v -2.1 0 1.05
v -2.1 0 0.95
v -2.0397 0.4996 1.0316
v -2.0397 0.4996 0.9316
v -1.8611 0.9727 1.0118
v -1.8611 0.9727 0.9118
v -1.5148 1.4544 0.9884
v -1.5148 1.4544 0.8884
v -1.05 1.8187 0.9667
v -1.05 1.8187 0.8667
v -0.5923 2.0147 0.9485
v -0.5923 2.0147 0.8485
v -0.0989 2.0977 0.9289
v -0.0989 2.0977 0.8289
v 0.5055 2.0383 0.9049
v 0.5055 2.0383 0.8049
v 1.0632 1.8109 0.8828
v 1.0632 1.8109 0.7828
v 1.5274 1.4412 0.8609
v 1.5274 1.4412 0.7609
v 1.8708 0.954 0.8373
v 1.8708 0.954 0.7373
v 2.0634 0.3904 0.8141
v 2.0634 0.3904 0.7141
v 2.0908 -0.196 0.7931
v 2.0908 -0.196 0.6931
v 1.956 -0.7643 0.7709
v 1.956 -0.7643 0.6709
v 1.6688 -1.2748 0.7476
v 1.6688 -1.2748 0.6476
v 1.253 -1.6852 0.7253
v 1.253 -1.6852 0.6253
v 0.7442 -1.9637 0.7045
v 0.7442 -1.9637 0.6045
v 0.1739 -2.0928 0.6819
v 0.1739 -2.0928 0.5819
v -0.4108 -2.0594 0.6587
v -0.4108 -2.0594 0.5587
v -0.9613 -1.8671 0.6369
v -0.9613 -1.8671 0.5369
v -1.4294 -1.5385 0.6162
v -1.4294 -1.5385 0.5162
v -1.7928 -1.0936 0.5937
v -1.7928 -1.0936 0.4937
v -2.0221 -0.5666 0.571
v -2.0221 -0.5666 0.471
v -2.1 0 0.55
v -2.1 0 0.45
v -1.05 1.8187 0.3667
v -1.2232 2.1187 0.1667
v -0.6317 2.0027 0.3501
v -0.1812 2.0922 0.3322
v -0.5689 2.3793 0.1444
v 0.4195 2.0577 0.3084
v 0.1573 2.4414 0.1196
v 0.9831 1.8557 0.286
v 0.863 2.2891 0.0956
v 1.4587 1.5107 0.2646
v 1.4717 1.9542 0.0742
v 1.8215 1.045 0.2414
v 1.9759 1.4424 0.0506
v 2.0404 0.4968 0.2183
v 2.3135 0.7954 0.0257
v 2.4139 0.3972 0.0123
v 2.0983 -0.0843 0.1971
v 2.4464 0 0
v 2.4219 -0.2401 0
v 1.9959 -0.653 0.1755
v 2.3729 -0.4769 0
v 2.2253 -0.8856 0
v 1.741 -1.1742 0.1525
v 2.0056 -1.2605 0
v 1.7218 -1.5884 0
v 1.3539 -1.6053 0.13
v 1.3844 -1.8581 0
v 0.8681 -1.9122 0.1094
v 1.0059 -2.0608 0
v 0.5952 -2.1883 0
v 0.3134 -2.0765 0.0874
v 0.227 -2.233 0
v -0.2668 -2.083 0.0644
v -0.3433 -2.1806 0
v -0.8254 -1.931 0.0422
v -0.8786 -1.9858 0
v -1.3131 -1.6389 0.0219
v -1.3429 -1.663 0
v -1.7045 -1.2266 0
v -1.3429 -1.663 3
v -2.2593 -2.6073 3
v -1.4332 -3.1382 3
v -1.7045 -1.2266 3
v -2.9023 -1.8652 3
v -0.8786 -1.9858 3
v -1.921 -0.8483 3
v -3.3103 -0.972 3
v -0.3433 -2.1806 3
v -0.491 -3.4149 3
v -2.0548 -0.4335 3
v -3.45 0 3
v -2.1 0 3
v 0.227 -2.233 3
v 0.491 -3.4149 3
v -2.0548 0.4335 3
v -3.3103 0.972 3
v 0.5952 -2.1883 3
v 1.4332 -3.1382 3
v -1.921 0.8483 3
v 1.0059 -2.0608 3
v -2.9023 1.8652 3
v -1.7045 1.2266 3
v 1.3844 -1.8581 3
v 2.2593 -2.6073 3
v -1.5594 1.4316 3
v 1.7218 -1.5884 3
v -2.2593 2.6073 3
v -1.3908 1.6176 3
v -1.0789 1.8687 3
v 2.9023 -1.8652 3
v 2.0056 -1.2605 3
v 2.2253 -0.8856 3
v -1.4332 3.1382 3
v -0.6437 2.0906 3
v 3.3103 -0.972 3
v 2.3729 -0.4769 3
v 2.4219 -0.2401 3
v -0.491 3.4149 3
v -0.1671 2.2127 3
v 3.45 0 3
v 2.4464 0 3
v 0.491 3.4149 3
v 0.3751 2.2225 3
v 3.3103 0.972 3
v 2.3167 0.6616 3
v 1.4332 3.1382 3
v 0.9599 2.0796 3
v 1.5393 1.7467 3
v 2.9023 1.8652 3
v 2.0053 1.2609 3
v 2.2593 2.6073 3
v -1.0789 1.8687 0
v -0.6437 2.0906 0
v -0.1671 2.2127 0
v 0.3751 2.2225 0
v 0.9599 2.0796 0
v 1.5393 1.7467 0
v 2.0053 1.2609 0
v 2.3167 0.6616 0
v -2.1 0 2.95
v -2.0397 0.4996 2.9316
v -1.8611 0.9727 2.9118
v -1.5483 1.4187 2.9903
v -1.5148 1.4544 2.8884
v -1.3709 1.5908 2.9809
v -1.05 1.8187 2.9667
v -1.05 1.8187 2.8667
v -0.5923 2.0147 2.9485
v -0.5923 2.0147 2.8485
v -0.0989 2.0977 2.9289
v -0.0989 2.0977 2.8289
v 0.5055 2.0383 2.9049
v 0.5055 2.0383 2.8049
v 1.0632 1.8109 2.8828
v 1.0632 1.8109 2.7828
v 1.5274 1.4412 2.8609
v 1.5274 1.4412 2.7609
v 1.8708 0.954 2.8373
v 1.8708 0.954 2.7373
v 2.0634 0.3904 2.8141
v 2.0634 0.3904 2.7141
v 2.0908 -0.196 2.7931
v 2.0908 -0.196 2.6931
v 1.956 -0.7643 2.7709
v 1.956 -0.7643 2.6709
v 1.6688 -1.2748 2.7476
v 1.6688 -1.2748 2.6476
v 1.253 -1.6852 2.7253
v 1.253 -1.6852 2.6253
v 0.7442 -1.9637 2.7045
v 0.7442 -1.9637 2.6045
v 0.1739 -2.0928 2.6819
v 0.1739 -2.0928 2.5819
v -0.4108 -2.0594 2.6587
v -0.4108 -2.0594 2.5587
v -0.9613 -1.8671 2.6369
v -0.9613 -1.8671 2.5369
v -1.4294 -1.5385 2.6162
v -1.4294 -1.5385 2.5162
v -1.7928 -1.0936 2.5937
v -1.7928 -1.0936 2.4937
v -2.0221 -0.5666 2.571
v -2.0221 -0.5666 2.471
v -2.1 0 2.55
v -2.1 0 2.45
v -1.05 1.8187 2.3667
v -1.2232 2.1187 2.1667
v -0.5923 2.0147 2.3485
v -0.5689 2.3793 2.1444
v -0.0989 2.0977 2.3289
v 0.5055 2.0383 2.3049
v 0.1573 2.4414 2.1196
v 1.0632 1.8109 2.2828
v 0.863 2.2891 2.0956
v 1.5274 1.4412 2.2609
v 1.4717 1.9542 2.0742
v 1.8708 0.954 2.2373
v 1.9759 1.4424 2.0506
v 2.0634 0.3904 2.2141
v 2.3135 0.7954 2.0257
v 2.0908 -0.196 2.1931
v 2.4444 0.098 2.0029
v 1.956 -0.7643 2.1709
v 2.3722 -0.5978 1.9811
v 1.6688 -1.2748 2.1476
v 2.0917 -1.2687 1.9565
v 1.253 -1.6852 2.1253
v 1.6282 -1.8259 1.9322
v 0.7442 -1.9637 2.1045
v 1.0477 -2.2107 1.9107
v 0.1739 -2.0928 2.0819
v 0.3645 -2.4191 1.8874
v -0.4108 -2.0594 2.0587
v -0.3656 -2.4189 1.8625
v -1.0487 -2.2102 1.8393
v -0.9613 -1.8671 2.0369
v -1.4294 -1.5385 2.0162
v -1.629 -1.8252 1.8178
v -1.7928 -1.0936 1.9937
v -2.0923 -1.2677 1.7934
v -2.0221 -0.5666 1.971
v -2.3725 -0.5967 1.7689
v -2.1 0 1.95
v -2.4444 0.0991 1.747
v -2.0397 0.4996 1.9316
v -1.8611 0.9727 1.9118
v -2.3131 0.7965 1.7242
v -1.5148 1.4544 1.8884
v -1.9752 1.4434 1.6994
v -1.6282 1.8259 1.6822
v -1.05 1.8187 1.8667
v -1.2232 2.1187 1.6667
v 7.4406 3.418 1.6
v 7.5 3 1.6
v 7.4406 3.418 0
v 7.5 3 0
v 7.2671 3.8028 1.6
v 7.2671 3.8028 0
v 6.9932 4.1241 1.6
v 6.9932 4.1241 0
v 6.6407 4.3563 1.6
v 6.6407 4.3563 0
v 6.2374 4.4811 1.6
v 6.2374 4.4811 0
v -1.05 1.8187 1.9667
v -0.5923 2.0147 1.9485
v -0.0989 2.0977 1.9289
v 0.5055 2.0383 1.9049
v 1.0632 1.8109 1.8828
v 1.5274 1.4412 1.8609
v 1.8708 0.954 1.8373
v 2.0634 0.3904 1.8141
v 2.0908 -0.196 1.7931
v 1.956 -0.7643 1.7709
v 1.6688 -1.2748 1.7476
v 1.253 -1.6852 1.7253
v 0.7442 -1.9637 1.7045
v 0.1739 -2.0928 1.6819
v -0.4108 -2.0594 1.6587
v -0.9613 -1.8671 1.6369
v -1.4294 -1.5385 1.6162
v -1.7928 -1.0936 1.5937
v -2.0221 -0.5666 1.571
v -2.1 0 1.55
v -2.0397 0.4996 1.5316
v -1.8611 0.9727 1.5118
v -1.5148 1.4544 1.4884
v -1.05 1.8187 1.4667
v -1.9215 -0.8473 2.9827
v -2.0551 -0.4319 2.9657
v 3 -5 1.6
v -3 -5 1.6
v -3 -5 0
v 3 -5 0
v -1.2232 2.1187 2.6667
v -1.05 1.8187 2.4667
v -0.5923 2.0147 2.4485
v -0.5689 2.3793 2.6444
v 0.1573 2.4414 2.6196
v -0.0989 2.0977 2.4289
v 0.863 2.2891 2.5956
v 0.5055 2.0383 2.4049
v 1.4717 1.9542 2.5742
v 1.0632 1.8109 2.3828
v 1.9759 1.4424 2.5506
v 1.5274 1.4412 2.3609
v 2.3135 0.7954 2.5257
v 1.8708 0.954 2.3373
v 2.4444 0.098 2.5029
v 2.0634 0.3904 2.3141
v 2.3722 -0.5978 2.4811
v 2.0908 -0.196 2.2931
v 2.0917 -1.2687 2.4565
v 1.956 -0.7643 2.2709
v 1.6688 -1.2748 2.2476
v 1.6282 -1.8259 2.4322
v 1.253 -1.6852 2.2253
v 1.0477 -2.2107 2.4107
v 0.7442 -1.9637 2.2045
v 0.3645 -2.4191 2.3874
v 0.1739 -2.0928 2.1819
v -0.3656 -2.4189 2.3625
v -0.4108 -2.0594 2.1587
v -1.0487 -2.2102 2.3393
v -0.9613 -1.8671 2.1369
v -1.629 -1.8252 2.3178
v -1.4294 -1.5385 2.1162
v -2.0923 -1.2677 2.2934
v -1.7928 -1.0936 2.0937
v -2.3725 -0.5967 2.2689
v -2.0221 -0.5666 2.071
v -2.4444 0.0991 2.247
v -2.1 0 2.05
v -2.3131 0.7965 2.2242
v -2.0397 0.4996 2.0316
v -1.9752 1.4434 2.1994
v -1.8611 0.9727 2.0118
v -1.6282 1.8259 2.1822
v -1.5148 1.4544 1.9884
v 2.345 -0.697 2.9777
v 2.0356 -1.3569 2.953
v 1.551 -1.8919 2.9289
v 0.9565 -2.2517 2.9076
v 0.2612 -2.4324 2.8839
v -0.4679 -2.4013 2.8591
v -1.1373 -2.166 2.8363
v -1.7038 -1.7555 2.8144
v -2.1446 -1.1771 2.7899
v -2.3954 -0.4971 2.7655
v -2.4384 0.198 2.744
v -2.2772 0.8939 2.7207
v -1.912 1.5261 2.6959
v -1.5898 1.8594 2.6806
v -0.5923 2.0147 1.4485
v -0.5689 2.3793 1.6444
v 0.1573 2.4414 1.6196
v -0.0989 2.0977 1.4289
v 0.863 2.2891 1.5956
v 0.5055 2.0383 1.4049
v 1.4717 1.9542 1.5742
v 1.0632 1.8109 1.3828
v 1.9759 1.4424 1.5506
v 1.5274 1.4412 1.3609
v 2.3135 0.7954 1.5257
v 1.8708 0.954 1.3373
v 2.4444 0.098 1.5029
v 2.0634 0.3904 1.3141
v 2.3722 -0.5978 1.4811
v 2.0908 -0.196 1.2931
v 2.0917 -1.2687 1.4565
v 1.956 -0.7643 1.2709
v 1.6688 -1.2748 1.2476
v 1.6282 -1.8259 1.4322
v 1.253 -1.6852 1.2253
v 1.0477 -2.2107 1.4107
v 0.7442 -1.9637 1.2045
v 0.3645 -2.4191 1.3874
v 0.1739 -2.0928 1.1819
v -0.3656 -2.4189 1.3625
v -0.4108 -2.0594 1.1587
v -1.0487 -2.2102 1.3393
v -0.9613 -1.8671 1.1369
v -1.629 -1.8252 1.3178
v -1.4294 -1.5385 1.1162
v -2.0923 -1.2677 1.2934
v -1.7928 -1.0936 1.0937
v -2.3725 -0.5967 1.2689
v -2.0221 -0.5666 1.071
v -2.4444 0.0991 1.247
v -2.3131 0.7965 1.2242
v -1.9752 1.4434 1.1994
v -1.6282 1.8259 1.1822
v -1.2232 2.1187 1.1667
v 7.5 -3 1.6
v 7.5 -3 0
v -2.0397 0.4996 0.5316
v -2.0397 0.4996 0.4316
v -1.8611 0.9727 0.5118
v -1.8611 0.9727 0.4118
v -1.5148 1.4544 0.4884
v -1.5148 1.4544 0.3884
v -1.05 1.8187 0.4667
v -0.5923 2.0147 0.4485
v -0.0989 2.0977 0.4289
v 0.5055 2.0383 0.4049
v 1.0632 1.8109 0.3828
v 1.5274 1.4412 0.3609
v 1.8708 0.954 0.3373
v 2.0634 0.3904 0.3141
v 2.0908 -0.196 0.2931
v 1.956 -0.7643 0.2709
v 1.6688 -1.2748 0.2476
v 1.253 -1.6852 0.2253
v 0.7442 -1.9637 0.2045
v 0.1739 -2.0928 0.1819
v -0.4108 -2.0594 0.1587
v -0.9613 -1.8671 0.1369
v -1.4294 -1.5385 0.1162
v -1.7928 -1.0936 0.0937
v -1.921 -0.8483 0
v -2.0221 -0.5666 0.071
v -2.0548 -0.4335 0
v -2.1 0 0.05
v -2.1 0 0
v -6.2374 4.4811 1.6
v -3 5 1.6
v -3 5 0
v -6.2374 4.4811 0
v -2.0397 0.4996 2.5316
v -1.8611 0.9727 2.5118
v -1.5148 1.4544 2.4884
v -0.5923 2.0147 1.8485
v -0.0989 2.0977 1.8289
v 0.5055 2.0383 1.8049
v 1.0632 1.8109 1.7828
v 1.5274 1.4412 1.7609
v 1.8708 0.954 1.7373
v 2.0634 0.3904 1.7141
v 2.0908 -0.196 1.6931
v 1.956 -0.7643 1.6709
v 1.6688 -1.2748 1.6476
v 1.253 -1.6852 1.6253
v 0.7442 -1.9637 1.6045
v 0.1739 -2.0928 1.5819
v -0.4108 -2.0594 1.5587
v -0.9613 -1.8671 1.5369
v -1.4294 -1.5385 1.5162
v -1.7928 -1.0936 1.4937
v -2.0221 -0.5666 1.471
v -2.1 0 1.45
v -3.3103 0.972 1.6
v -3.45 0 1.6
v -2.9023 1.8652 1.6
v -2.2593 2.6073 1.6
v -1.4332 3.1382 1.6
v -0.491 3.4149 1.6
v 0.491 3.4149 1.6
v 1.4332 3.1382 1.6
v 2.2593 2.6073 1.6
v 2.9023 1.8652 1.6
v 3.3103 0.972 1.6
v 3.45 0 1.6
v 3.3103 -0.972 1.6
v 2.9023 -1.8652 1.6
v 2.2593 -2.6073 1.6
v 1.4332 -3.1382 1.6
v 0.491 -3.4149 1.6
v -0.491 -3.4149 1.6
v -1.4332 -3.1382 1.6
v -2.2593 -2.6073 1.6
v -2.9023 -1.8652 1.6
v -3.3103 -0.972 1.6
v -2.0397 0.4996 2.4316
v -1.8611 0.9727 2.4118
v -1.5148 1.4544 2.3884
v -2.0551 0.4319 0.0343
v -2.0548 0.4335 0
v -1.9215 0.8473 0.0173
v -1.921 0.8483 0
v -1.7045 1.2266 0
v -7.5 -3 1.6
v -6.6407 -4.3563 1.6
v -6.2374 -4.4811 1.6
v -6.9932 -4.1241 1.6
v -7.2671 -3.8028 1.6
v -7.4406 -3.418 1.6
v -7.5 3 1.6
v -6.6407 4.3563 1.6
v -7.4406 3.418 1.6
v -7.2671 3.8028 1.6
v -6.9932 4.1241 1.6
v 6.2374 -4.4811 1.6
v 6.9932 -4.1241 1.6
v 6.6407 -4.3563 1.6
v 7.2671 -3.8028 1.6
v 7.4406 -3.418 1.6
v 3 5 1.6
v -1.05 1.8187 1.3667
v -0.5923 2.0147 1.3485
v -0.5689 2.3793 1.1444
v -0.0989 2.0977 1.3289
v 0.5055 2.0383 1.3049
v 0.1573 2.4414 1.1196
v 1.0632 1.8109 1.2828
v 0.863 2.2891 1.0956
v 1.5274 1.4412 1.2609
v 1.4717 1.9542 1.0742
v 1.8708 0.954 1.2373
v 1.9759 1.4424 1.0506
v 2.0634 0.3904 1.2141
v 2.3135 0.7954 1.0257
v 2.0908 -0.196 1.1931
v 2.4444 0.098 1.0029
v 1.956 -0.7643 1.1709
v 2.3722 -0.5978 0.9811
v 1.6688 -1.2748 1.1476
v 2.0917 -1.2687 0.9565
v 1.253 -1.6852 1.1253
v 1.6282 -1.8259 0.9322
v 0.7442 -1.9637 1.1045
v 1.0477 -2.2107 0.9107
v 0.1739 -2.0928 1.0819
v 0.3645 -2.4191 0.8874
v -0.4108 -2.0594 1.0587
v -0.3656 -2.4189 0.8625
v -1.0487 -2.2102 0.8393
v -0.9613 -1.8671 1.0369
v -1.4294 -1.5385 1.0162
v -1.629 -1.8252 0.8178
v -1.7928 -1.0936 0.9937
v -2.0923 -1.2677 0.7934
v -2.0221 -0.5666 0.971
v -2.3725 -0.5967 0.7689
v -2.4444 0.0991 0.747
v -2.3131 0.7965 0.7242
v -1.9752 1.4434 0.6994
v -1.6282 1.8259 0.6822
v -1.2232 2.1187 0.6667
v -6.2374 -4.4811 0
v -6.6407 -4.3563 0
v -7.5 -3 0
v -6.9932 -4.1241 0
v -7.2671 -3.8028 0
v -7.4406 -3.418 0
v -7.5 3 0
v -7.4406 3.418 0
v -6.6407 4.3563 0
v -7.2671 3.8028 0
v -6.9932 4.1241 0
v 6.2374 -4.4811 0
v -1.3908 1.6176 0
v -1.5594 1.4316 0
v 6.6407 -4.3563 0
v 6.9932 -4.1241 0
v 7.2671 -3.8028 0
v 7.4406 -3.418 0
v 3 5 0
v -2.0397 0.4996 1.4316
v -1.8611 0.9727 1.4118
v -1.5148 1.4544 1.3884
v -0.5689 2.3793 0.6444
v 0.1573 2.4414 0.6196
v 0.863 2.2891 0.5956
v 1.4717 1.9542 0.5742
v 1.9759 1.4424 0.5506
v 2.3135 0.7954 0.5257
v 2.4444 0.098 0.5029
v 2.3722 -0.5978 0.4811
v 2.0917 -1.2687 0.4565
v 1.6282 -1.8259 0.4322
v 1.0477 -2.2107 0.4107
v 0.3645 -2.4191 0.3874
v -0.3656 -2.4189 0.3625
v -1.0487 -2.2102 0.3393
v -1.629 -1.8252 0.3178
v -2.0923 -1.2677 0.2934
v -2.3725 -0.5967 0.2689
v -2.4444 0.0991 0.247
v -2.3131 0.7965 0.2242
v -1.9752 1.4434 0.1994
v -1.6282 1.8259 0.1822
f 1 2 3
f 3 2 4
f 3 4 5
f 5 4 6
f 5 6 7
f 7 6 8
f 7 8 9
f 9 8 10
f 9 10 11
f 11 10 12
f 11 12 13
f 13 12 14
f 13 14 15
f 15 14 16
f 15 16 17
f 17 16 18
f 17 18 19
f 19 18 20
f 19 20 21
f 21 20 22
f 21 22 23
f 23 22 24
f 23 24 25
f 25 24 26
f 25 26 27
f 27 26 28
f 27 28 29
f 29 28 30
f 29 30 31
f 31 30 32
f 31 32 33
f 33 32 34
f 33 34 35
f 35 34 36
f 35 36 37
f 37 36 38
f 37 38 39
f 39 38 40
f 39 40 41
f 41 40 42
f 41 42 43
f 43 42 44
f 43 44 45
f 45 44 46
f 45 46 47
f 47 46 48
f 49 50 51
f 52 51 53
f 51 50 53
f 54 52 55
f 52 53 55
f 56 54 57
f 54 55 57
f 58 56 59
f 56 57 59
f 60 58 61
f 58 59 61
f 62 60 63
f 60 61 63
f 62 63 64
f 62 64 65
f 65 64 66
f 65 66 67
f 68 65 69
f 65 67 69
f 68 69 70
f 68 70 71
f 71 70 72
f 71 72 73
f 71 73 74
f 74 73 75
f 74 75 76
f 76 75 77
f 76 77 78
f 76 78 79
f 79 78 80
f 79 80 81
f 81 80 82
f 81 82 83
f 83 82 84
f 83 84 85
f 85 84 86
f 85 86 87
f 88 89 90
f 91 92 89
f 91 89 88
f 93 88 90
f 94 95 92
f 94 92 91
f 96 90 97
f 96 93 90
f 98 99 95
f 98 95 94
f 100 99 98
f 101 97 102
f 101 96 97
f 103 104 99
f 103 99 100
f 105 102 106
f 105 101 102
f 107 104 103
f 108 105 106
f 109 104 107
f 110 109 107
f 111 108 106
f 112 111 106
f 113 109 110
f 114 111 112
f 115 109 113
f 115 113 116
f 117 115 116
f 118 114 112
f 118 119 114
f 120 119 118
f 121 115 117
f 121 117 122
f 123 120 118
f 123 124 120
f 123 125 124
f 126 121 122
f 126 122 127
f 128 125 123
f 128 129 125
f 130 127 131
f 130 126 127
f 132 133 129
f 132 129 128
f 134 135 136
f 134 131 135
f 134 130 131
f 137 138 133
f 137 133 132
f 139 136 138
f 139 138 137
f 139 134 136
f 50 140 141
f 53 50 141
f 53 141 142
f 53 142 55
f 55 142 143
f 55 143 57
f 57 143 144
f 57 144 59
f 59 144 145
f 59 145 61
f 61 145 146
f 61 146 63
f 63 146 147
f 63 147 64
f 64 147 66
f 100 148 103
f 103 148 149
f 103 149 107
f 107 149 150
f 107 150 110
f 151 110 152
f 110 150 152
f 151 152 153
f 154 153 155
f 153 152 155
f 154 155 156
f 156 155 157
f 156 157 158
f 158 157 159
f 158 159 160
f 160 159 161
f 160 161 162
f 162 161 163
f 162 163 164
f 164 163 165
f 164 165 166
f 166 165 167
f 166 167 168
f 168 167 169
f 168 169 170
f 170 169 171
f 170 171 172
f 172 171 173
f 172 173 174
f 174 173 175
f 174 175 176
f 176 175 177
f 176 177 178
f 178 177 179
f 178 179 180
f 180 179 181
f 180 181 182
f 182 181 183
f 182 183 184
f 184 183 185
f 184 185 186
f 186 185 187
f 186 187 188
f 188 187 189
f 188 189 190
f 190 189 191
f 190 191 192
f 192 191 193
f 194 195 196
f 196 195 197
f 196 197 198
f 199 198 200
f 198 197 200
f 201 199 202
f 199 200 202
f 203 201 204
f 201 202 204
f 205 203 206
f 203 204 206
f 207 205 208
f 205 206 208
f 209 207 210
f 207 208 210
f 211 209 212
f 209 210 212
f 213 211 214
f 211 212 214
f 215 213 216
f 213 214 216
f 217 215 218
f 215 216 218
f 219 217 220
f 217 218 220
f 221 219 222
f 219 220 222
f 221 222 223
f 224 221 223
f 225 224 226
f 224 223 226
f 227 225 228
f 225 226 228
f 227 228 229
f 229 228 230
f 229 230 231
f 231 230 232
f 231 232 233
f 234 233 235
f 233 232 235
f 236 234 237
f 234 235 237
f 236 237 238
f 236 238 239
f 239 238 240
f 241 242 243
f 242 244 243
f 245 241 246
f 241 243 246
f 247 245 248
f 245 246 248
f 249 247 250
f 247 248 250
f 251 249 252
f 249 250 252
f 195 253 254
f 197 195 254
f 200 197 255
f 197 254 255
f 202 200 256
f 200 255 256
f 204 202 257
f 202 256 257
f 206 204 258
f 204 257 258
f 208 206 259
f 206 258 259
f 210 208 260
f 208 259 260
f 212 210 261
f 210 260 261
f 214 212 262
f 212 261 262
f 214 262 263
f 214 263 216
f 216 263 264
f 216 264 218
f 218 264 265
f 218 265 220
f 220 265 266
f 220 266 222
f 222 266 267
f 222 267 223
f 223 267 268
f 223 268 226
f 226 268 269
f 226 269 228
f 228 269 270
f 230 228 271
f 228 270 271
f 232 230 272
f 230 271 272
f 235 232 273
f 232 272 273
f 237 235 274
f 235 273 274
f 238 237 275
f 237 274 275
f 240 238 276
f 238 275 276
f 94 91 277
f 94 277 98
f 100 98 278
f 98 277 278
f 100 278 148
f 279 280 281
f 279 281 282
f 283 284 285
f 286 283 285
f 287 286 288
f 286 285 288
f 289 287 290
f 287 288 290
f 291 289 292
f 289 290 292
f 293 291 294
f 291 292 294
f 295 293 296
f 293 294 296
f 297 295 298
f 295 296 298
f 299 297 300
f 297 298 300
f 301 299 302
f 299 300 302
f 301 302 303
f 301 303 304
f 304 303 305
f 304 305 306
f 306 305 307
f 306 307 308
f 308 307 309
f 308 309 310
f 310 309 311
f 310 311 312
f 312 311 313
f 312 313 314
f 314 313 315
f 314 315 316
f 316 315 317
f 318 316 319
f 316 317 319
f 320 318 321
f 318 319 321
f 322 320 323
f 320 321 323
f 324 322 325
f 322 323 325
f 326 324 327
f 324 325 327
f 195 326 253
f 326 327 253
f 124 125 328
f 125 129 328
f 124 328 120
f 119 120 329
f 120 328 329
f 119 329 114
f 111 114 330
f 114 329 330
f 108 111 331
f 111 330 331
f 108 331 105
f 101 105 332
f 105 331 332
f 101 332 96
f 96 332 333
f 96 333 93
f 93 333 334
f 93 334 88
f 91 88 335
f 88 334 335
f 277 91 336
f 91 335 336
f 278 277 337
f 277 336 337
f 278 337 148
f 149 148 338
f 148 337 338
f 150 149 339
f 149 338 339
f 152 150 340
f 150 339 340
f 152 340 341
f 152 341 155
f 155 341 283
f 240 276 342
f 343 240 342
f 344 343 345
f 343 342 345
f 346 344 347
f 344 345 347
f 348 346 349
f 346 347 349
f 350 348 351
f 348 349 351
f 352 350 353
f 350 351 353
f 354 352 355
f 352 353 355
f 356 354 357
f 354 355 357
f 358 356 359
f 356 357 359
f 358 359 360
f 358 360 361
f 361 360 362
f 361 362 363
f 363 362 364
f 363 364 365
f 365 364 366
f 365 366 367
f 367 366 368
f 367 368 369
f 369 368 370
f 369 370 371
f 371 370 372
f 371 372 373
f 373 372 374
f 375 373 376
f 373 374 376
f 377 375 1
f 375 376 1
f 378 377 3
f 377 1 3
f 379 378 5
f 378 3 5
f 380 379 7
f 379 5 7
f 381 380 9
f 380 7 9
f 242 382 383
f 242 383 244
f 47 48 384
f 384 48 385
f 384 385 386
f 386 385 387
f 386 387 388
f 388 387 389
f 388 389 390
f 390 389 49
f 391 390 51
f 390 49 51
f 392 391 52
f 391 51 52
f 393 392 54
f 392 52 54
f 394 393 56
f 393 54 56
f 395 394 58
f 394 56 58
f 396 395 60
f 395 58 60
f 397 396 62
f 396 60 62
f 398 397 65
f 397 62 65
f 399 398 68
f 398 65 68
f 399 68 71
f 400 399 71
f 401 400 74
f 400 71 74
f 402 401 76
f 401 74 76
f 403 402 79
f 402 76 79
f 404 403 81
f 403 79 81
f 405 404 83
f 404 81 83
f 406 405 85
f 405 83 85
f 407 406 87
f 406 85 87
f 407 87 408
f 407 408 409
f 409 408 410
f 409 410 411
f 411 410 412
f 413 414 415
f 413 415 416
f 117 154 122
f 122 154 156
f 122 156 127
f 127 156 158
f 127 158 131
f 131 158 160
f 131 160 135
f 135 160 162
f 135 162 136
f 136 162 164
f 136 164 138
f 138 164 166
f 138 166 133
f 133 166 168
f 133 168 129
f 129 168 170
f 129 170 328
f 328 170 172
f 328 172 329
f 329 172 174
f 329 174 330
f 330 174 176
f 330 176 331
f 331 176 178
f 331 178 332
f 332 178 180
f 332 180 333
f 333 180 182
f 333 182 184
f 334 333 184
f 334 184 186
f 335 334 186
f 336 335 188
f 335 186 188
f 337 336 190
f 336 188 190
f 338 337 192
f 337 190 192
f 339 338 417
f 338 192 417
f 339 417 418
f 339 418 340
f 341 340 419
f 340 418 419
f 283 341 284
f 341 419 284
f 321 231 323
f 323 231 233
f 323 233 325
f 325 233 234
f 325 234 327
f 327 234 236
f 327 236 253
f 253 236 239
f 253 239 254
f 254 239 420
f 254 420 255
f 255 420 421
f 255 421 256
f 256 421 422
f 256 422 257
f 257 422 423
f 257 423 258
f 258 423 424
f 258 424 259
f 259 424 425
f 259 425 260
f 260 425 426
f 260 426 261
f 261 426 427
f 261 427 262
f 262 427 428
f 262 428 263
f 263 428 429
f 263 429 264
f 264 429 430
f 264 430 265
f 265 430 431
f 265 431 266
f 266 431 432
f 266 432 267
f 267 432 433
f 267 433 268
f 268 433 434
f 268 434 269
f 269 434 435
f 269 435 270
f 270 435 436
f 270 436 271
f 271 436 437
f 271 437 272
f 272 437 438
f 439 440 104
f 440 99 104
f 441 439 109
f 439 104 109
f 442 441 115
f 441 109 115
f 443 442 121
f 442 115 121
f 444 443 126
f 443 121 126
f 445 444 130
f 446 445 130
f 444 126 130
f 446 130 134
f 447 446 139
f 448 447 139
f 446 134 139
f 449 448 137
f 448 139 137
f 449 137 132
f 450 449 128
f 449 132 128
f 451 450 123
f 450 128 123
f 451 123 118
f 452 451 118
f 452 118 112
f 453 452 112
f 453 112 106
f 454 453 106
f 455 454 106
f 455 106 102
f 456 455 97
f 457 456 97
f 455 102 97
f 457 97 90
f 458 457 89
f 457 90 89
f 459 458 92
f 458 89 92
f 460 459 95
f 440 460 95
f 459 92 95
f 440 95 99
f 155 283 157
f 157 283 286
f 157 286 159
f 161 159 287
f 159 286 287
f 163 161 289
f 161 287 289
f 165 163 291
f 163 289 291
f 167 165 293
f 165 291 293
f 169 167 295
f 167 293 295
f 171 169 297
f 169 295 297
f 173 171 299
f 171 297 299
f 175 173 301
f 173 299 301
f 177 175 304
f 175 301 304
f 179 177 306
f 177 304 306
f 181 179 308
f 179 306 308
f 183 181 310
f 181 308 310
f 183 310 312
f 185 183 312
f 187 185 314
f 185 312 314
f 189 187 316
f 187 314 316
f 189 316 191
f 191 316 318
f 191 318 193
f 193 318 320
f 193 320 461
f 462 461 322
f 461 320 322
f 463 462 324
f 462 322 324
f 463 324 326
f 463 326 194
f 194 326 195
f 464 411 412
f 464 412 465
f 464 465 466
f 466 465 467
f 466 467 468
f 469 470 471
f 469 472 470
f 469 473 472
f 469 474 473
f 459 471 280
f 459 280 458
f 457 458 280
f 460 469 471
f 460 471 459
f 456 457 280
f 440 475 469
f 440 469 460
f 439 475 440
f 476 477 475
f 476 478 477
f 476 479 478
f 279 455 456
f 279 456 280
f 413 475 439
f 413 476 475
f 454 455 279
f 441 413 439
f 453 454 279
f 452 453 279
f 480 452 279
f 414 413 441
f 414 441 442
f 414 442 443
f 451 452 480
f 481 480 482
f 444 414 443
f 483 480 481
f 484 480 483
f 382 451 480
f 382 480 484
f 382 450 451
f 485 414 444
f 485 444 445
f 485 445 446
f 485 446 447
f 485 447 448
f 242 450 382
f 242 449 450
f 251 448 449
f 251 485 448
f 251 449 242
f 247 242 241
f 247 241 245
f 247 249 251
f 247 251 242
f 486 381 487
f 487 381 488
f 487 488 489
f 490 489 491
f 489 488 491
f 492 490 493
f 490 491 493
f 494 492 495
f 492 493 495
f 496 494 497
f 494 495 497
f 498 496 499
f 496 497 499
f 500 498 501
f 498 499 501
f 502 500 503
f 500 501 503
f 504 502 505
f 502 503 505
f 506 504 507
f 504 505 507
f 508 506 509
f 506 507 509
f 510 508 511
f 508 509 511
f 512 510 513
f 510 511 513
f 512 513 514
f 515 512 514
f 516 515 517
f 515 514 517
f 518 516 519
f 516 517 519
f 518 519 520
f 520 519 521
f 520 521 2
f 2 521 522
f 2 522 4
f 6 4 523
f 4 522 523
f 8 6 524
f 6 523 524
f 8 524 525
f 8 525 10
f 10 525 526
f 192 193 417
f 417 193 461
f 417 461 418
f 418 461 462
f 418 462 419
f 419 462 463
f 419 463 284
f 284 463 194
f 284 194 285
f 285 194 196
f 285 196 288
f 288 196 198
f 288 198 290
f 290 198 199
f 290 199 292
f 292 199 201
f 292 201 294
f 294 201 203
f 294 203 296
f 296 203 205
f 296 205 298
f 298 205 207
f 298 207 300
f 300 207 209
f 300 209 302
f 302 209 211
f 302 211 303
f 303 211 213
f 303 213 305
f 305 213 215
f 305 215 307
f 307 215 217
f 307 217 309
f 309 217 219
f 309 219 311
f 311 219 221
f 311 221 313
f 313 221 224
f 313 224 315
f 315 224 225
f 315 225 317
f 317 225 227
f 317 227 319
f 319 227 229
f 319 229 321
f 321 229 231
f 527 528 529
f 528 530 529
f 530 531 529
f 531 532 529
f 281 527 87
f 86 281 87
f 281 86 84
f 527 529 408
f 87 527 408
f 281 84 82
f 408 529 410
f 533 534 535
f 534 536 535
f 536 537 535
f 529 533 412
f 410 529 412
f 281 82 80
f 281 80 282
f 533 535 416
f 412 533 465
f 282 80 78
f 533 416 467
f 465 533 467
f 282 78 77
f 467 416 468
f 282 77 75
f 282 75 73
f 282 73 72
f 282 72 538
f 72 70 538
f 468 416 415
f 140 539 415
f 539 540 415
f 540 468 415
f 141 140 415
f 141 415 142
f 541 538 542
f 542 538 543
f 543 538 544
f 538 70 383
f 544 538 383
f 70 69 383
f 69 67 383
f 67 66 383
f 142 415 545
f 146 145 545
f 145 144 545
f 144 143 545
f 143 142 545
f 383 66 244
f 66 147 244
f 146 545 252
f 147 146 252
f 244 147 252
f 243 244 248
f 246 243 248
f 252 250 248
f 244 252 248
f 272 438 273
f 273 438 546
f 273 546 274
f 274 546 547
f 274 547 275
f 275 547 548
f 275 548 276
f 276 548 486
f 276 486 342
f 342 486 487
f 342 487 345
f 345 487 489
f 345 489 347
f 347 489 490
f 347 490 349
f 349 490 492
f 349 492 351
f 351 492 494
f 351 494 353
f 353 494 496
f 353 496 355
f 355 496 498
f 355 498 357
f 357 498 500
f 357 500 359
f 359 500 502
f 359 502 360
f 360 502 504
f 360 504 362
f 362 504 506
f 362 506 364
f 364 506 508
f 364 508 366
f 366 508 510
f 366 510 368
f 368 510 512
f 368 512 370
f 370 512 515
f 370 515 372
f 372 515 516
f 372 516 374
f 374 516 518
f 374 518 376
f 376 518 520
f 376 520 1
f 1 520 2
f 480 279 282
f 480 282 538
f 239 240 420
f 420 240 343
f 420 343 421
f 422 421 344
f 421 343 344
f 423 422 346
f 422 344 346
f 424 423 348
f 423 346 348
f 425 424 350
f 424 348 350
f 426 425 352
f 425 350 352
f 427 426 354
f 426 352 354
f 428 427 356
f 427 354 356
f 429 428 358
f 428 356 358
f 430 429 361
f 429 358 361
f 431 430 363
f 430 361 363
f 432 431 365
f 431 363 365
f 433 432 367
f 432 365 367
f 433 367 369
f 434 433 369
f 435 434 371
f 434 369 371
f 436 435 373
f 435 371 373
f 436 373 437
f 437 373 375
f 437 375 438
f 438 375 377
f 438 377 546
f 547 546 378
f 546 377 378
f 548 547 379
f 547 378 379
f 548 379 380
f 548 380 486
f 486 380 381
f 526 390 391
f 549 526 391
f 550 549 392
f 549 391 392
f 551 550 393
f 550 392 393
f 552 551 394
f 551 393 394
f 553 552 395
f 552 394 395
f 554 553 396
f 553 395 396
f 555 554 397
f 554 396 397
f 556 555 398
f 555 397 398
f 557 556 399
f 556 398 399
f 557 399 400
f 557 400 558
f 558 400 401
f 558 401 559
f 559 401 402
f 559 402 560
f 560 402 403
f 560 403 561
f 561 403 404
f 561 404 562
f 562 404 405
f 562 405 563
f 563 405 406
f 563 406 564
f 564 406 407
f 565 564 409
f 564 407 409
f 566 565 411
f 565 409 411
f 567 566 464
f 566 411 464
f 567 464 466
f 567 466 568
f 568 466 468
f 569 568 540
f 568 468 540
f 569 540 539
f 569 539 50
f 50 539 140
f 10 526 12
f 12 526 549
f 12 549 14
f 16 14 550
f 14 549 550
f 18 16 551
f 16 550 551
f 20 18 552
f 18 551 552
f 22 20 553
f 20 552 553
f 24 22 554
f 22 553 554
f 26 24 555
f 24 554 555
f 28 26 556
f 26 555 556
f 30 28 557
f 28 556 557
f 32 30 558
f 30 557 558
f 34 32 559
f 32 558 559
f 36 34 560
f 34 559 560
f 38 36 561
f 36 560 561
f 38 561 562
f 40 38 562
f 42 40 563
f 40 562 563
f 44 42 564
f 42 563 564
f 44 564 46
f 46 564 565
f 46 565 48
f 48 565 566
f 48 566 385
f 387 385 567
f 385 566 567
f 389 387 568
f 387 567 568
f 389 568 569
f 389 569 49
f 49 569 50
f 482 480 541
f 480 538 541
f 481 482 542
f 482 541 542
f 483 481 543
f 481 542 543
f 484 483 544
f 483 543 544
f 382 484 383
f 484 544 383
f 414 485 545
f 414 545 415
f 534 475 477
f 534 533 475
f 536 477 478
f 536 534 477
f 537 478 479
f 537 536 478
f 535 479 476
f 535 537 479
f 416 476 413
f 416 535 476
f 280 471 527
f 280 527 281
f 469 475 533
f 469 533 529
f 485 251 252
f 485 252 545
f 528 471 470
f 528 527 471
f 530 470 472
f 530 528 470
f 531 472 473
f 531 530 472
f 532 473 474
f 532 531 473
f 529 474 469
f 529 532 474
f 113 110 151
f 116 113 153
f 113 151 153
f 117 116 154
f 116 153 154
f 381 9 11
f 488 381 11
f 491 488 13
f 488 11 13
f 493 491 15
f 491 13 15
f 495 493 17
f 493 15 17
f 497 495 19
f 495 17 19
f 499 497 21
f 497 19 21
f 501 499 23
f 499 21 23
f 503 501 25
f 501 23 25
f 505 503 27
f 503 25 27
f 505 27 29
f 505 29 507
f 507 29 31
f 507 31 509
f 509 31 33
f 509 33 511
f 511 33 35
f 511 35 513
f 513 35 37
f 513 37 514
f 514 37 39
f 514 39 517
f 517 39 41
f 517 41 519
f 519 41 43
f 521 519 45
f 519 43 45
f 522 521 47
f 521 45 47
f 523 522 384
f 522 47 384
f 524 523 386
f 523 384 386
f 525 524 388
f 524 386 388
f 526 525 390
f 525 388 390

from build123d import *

# Parameters (mm, degrees)
BOSS_EXTRUDE1_DEPTH        = 1.6
DRAFT1_ANGLE               = 9.10617604
SKETCH2_W                  = 3.45
SKETCH2_H                  = 1.4
F_4_2_4_2_DIAMETER_HOLE1_D = 4.2
FILLET1_R                  = 1.5
CUT_SWEEP1_PITCH           = 0.5


with BuildPart() as part:
    # Sketch1 → Boss-Extrude1 (new body)
    with BuildSketch(Plane.XY.offset(1.6)):
        Polygon((3, -5), (6.092206474, -4.504366896), (7.5, 4.278719262), (3, 5), (-3, 5), (-7.5, 4.278719262), (-7.5, -4.278719262), (-3, -5), align=None)
    extrude(amount=-BOSS_EXTRUDE1_DEPTH)

    # Draft1
    draft1_faces = [part.faces().sort_by_distance(p)[0] for p in [
        (6.796103237, -0.112823817, 0.8),
    ]]
    draft(draft1_faces, Plane(origin=(7.5, 4.278719262, 0), x_dir=(0.9873967528040769, -0.15826450186938548, 0), z_dir=(0.15826450186938548, 0.9873967528040769, 0)), DRAFT1_ANGLE)

    # Sketch2 → Revolve1 (revolve)
    with BuildSketch(Plane.XZ, mode=Mode.PRIVATE) as revolve1_sk:
        with Locations((1.725, 2.3)):
            Rectangle(SKETCH2_W, SKETCH2_H)
    revolve(revolve1_sk.sketch.rotate(Axis((0, 0, 3), (0, 0, -1)), 180), axis=Axis((0, 0, 3), (0, 0, -1)))

    # Ø4.2 (4.2) Diameter Hole1 (through all)
    with Locations(Plane.XY.offset(3)):
        with Locations((0, 0)):
            Hole(F_4_2_4_2_DIAMETER_HOLE1_D / 2)

    # Fillet1
    fillet1_edges = [part.edges().sort_by_distance(p)[0] for p in [
        (-7.5, -4.278719262, 0.8),
        (-7.5, 4.278719262, 0.8),
        (7.5, 4.278719262, 0.8),
        (7.5, -4.278719262, 0.8),
    ]]
    fillet(fillet1_edges, radius=FILLET1_R)

    # Cut-Sweep1: arcs per turn and ends read off the stored shape
    # Cut-Sweep1: the profile of Sketch6 screwed along a right-hand helix through 8 turns, 6 arcs to a turn; built about Z, then put on its axis
    cut_sweep1_z = Axis((0, 0, 0), (0, 0, 1))
    cut_sweep1_corners = [(-1.223205081, -2.118653348, -0.666666667), (-0.96339746, -1.668653348, -0.366666667), (-0.96339746, -1.668653348, -0.966666667)]
    with BuildLine(mode=Mode.PRIVATE) as cut_sweep1_profile:
        Line(cut_sweep1_corners[0], cut_sweep1_corners[1])
        Line(cut_sweep1_corners[1], cut_sweep1_corners[2])
        Line(cut_sweep1_corners[2], cut_sweep1_corners[0])
    cut_sweep1_cap = Face(cut_sweep1_profile.wire())
    cut_sweep1_turn_angles = [0, 30, 60, 90, 120, 150, 180, 210, 240, 270, 300, 330, 360]
    cut_sweep1_turn_weights = [1, 0.8660254037844387, 1, 0.8660254037844387, 1, 0.8660254037844387, 1, 0.8660254037844387, 1, 0.8660254037844387, 1, 0.8660254037844387, 1]
    cut_sweep1_turn_rails = [Edge.make_bspline([Vector(p[0], p[1], 0).rotate(cut_sweep1_z, cut_sweep1_turn_angles[k]) / cut_sweep1_turn_weights[k] + Vector(0, 0, p[2] + CUT_SWEEP1_PITCH * cut_sweep1_turn_angles[k] / 360) for k in range(13)], [0, 0, 0, 1, 1, 2, 2, 3, 3, 4, 4, 5, 5, 6, 6, 6], 2, cut_sweep1_turn_weights) for p in cut_sweep1_corners]
    cut_sweep1_turn_sides = [Face.make_surface_from_curves(cut_sweep1_turn_rails[p[0]], cut_sweep1_turn_rails[p[1]]) for p in [(0, 1), (1, 2), (2, 0)]]
    cut_sweep1 = Plane(origin=(0, 0, 3), x_dir=(1, 0, 0), z_dir=(0, 0, -1)) * Solid(Shell([*[p.moved(Location((0, 0, CUT_SWEEP1_PITCH * i))) for i in range(8) for p in cut_sweep1_turn_sides], cut_sweep1_cap, cut_sweep1_cap.rotate(cut_sweep1_z, 2880).moved(Location((0, 0, CUT_SWEEP1_PITCH * 2880 / 360)))]))
    add(cut_sweep1, mode=Mode.SUBTRACT)


solid = part.part
